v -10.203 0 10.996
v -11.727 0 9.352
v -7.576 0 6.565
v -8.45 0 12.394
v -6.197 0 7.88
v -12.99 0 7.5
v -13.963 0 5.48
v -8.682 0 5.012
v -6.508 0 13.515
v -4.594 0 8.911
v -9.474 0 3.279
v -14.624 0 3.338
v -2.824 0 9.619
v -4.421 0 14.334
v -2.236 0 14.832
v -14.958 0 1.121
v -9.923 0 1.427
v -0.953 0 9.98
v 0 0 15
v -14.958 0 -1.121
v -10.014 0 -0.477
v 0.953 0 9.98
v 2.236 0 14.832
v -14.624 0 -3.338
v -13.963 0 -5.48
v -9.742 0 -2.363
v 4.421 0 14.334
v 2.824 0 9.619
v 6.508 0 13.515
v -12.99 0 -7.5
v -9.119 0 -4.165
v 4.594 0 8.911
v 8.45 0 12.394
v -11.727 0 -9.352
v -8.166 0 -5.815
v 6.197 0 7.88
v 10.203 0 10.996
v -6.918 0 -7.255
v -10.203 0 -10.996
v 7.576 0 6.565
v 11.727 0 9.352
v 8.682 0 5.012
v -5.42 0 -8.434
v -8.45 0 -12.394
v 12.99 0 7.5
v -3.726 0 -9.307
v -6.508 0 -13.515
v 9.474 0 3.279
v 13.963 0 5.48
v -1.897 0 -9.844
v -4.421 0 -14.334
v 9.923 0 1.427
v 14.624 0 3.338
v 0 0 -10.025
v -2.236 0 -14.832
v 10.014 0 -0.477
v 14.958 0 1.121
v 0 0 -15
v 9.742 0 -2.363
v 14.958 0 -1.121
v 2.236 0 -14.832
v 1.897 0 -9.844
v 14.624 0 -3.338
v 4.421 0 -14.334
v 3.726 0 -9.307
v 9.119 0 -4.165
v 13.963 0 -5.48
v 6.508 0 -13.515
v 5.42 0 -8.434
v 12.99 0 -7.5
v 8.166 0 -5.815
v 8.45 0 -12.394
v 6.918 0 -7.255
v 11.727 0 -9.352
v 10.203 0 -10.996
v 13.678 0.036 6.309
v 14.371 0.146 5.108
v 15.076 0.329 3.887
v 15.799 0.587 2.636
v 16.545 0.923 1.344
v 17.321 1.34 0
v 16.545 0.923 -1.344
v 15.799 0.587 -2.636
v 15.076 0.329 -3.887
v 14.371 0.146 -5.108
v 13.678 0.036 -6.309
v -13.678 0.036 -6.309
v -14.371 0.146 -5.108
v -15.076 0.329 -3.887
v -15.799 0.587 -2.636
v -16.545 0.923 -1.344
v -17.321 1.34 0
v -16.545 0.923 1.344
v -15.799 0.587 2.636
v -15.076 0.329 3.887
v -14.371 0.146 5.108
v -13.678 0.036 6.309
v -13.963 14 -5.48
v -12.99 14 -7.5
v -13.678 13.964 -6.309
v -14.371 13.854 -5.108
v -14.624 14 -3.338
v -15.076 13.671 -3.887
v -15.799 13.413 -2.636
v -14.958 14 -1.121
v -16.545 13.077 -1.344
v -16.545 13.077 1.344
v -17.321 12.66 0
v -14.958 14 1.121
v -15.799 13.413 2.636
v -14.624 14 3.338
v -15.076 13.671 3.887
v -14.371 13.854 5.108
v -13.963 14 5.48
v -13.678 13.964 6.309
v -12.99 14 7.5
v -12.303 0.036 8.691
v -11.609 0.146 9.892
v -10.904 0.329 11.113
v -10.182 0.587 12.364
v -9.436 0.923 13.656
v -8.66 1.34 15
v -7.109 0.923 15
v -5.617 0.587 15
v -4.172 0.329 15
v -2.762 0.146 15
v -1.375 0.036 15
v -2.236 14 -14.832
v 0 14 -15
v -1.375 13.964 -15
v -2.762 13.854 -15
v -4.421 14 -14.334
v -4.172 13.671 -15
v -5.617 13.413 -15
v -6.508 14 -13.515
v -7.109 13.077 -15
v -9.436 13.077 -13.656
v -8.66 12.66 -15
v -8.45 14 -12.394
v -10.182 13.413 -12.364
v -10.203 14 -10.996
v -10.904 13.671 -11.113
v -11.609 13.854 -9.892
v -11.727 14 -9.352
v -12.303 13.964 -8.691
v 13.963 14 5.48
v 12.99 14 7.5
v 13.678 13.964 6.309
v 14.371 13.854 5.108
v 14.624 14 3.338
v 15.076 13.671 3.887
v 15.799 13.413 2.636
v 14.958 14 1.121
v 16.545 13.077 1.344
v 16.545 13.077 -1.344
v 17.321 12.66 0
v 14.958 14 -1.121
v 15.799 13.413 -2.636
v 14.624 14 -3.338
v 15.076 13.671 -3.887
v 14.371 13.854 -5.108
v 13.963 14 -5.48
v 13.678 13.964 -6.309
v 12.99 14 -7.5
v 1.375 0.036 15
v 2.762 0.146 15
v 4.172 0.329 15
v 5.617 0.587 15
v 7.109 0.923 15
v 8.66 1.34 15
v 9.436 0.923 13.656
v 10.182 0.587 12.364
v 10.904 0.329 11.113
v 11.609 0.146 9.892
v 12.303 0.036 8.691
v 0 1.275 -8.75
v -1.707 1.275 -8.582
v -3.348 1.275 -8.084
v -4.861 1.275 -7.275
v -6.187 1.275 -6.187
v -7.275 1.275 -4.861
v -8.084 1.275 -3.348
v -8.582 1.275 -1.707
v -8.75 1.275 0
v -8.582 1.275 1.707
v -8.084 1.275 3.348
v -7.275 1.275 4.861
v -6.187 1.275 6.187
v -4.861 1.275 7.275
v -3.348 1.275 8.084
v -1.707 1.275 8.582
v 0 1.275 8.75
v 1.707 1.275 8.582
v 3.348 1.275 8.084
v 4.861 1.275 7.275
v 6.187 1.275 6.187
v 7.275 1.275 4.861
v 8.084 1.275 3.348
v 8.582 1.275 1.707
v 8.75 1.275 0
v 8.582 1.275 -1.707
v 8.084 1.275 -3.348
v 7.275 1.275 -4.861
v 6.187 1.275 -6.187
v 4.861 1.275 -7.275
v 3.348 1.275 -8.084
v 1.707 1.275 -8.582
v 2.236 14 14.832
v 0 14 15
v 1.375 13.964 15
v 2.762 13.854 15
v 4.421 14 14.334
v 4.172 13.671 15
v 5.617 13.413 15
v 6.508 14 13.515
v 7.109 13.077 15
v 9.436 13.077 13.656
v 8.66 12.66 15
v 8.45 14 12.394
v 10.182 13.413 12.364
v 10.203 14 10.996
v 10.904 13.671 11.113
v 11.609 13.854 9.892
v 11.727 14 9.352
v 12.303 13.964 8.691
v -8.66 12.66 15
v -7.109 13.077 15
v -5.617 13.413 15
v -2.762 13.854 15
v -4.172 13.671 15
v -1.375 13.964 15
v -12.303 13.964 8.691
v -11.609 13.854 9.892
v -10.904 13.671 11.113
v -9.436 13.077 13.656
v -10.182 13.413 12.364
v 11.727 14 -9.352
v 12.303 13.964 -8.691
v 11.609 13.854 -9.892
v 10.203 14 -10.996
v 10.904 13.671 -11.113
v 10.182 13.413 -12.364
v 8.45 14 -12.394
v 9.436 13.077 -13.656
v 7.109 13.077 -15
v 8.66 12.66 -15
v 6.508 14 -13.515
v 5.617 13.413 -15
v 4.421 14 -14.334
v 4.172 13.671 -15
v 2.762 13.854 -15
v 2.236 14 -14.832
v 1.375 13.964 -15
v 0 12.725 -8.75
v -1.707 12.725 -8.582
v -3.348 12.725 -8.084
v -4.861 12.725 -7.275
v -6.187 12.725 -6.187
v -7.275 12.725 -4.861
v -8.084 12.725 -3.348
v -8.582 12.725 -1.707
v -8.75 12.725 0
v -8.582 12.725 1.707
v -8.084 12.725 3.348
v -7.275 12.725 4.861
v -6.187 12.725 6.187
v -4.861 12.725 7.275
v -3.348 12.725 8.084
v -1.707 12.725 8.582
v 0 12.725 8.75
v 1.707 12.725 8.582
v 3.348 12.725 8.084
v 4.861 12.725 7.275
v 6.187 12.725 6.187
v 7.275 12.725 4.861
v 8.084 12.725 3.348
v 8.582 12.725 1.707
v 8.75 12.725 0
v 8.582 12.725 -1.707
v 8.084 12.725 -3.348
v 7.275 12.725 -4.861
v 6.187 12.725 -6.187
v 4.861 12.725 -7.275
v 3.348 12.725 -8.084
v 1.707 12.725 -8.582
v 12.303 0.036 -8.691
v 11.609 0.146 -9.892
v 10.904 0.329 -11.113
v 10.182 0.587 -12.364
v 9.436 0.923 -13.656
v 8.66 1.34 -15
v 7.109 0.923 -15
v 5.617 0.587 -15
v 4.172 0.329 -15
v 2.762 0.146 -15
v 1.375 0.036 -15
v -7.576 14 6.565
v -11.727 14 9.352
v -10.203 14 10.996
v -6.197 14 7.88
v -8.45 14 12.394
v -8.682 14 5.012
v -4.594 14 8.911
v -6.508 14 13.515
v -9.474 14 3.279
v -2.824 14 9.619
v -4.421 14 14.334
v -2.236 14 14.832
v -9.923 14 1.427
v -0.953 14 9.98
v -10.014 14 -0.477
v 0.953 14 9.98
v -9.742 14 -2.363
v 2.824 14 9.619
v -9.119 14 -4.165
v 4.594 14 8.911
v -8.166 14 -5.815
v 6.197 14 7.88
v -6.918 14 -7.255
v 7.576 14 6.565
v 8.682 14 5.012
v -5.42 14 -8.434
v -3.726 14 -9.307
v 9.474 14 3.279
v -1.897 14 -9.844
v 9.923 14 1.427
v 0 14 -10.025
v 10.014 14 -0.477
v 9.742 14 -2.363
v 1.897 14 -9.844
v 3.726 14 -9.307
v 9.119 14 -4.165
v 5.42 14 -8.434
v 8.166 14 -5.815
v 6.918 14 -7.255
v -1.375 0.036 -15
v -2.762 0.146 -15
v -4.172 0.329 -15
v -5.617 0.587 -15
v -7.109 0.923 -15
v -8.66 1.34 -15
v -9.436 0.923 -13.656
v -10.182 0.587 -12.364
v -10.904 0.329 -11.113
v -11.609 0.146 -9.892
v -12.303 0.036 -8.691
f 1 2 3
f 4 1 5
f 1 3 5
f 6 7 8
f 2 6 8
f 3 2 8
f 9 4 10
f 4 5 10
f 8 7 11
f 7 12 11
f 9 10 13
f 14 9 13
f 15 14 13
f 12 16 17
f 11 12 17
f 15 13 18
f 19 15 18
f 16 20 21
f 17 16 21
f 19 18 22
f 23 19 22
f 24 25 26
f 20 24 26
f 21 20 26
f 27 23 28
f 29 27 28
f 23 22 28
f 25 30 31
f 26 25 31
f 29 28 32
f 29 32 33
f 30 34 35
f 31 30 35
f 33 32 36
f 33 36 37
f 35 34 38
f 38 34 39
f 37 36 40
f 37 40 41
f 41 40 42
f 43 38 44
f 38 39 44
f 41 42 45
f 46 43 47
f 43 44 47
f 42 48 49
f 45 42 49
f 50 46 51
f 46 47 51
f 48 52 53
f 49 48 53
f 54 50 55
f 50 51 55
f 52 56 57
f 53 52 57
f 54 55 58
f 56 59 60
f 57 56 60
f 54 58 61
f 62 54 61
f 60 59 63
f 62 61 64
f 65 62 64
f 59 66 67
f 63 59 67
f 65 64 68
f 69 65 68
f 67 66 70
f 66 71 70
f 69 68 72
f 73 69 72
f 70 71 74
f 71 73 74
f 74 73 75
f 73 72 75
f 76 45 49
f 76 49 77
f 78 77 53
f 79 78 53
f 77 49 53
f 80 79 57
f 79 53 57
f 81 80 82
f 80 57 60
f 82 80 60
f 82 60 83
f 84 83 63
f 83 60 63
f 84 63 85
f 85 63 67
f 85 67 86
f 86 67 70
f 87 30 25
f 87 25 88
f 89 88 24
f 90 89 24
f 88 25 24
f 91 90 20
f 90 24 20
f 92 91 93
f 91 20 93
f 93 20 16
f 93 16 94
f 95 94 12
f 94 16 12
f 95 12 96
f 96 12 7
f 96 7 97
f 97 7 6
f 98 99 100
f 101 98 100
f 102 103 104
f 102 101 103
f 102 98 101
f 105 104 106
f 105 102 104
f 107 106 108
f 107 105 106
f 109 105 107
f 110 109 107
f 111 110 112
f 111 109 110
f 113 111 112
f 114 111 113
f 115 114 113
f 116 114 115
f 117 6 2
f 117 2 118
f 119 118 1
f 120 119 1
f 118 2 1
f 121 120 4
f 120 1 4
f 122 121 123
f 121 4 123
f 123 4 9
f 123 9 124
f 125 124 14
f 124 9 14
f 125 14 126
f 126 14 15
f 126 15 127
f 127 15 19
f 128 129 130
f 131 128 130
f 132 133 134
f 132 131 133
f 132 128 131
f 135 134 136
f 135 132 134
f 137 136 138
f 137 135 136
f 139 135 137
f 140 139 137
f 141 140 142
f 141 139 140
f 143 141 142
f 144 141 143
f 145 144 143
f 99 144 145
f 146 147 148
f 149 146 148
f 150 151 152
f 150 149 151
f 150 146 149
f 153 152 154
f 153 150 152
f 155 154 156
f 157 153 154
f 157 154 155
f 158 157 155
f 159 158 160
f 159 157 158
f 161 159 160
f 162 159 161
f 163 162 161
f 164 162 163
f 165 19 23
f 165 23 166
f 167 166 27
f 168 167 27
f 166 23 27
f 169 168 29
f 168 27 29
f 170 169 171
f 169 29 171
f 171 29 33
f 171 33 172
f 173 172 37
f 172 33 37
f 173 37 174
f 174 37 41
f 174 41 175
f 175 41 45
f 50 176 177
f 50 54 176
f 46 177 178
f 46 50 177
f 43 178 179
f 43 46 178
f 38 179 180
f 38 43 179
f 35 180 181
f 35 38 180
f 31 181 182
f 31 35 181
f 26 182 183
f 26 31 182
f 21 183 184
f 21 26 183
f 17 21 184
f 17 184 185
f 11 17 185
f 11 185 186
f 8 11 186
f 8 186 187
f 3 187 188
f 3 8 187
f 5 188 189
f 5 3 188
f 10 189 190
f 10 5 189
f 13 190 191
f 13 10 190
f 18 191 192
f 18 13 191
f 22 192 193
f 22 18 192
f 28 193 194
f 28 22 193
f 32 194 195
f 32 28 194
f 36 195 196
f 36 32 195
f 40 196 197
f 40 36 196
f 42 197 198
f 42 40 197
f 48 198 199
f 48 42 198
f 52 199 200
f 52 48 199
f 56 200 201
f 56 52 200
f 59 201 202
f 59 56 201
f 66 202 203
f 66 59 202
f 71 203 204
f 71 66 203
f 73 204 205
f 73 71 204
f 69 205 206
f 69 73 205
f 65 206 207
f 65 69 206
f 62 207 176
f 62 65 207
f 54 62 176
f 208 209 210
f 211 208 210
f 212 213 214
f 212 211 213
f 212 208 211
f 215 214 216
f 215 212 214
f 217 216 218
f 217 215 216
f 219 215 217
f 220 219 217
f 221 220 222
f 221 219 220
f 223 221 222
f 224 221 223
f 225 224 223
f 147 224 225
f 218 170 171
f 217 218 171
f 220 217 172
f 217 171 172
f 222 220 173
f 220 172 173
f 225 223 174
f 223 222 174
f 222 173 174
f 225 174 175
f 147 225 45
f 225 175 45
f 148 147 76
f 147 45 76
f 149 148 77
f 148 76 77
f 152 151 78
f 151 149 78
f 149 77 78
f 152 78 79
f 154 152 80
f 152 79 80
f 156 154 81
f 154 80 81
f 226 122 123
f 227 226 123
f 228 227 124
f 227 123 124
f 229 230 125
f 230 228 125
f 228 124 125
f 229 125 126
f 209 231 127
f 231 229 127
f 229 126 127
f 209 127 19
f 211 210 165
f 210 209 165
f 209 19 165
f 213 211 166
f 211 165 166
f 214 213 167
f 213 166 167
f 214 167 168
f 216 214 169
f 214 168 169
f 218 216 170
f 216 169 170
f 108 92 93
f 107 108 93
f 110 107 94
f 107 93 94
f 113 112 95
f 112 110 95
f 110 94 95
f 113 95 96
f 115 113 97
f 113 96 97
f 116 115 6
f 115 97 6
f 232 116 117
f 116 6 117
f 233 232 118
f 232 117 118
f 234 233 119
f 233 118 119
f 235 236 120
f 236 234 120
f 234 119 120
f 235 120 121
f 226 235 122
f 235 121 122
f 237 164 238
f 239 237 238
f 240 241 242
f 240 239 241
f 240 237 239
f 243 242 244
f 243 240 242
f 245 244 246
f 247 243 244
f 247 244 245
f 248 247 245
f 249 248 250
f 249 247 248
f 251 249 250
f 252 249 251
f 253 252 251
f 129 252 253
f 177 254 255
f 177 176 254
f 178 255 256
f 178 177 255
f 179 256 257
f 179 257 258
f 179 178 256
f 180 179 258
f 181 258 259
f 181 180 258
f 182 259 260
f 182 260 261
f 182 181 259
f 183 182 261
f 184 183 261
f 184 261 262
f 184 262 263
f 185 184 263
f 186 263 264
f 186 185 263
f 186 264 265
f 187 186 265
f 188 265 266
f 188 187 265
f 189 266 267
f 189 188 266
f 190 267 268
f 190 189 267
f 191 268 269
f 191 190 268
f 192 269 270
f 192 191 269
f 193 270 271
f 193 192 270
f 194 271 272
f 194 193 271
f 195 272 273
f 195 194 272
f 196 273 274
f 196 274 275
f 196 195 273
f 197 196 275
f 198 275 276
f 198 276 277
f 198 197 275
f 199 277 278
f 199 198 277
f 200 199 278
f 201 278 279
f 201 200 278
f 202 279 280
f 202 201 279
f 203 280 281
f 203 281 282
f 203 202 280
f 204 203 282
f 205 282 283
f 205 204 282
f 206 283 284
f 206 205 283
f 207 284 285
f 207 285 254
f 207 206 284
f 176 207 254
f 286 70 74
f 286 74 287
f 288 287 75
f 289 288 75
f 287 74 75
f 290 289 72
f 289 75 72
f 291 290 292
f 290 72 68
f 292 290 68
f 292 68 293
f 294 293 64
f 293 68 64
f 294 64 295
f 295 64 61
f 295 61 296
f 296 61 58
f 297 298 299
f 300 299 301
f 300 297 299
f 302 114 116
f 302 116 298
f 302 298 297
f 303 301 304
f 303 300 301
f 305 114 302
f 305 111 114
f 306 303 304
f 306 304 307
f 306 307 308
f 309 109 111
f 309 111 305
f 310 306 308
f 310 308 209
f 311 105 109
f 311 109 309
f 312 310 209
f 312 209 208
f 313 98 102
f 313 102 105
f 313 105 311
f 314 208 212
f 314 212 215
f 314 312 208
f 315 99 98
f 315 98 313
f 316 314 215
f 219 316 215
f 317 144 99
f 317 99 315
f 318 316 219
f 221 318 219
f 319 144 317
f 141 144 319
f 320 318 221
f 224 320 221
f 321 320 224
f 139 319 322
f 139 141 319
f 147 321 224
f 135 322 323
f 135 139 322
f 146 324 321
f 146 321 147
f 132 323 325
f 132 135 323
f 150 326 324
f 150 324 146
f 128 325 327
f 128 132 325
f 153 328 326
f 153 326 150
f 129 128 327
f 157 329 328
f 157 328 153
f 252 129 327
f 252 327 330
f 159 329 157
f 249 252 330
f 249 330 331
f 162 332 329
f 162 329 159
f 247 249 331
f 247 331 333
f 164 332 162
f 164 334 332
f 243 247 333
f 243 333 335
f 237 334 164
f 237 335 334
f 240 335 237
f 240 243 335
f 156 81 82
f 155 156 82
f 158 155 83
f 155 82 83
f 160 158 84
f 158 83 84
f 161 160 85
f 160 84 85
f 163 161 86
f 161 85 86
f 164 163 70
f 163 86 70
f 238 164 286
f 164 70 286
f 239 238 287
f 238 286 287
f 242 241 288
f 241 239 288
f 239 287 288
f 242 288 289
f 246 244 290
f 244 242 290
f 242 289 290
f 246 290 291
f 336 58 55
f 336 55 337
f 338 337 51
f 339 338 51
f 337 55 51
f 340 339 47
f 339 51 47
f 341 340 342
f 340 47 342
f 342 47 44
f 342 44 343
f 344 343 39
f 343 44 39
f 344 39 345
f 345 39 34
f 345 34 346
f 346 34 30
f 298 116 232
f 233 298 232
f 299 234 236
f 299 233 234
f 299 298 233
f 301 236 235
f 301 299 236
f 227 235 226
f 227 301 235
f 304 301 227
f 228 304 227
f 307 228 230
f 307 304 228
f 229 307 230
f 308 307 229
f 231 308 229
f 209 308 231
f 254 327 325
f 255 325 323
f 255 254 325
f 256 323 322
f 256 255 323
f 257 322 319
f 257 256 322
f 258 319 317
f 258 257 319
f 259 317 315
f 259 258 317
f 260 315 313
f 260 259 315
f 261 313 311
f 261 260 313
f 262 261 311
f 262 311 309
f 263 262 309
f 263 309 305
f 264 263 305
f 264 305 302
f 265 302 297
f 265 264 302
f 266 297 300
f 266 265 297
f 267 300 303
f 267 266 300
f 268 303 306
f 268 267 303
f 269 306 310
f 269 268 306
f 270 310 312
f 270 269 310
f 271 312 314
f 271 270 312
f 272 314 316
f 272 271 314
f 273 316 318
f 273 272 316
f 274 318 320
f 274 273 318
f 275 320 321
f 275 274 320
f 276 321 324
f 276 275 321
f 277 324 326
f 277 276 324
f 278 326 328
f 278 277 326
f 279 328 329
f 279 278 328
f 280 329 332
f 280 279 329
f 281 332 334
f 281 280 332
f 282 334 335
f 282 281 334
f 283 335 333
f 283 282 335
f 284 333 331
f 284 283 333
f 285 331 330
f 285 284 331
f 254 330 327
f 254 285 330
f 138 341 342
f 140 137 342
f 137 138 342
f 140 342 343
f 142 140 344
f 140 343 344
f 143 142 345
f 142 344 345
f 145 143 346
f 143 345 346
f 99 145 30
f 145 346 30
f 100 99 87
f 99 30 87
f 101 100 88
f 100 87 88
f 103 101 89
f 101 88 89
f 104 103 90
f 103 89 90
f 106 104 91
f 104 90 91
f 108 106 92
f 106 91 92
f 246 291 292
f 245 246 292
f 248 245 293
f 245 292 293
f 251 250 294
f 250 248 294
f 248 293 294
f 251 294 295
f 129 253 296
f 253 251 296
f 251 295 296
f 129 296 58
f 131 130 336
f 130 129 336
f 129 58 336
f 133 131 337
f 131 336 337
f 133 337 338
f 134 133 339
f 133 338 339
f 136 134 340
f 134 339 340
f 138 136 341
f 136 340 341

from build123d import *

# Parameters (mm, degrees)
EXTRUDE_1_DEPTH = 14


with BuildPart() as part:
    # Эскиз1 → Бобышка-Вытянуть1 (new body)
    with BuildSketch(Plane(origin=(0, 0, 0), x_dir=(1, 0, 0), z_dir=(0, 1, 0))):
        Polygon((-8.660254038, 15), (-17.320508076, 0), (-8.660254038, -15), (8.660254038, -15), (17.320508076, 0), (8.660254038, 15), align=None)
    extrude(amount=EXTRUDE_1_DEPTH)

    # Эскиз2 → Вырез-Повернуть1 (revolve, cut)
    with BuildSketch(Plane(origin=(0, 0, 0), x_dir=(0, 0, -1), z_dir=(1, 0, 0))):
        Polygon((-15, 14), (-20, 14), (-20, 11.113248654), align=None)
        Polygon((-15, 0), (-20, 0), (-20, 2.886751346), align=None)
    revolve(axis=Axis((0, -1000, 0), (0, 1, 0)), mode=Mode.SUBTRACT)

    # Эскиз3 → Отверстие обработанное метчиком M20x2.51 (revolve, cut)
    with BuildSketch(Plane(origin=(0, 0, 0), x_dir=(0, 0, -1), z_dir=(1, 0, 0))):
        Polygon((0, 0), (0, 14), (10.025, 14), (8.75, 12.725), (8.75, 1.275), (10.025, 0), align=None)
    revolve(axis=Axis((0, -6.35, 0), (0, 1, 0)), mode=Mode.SUBTRACT)


solid = part.part
